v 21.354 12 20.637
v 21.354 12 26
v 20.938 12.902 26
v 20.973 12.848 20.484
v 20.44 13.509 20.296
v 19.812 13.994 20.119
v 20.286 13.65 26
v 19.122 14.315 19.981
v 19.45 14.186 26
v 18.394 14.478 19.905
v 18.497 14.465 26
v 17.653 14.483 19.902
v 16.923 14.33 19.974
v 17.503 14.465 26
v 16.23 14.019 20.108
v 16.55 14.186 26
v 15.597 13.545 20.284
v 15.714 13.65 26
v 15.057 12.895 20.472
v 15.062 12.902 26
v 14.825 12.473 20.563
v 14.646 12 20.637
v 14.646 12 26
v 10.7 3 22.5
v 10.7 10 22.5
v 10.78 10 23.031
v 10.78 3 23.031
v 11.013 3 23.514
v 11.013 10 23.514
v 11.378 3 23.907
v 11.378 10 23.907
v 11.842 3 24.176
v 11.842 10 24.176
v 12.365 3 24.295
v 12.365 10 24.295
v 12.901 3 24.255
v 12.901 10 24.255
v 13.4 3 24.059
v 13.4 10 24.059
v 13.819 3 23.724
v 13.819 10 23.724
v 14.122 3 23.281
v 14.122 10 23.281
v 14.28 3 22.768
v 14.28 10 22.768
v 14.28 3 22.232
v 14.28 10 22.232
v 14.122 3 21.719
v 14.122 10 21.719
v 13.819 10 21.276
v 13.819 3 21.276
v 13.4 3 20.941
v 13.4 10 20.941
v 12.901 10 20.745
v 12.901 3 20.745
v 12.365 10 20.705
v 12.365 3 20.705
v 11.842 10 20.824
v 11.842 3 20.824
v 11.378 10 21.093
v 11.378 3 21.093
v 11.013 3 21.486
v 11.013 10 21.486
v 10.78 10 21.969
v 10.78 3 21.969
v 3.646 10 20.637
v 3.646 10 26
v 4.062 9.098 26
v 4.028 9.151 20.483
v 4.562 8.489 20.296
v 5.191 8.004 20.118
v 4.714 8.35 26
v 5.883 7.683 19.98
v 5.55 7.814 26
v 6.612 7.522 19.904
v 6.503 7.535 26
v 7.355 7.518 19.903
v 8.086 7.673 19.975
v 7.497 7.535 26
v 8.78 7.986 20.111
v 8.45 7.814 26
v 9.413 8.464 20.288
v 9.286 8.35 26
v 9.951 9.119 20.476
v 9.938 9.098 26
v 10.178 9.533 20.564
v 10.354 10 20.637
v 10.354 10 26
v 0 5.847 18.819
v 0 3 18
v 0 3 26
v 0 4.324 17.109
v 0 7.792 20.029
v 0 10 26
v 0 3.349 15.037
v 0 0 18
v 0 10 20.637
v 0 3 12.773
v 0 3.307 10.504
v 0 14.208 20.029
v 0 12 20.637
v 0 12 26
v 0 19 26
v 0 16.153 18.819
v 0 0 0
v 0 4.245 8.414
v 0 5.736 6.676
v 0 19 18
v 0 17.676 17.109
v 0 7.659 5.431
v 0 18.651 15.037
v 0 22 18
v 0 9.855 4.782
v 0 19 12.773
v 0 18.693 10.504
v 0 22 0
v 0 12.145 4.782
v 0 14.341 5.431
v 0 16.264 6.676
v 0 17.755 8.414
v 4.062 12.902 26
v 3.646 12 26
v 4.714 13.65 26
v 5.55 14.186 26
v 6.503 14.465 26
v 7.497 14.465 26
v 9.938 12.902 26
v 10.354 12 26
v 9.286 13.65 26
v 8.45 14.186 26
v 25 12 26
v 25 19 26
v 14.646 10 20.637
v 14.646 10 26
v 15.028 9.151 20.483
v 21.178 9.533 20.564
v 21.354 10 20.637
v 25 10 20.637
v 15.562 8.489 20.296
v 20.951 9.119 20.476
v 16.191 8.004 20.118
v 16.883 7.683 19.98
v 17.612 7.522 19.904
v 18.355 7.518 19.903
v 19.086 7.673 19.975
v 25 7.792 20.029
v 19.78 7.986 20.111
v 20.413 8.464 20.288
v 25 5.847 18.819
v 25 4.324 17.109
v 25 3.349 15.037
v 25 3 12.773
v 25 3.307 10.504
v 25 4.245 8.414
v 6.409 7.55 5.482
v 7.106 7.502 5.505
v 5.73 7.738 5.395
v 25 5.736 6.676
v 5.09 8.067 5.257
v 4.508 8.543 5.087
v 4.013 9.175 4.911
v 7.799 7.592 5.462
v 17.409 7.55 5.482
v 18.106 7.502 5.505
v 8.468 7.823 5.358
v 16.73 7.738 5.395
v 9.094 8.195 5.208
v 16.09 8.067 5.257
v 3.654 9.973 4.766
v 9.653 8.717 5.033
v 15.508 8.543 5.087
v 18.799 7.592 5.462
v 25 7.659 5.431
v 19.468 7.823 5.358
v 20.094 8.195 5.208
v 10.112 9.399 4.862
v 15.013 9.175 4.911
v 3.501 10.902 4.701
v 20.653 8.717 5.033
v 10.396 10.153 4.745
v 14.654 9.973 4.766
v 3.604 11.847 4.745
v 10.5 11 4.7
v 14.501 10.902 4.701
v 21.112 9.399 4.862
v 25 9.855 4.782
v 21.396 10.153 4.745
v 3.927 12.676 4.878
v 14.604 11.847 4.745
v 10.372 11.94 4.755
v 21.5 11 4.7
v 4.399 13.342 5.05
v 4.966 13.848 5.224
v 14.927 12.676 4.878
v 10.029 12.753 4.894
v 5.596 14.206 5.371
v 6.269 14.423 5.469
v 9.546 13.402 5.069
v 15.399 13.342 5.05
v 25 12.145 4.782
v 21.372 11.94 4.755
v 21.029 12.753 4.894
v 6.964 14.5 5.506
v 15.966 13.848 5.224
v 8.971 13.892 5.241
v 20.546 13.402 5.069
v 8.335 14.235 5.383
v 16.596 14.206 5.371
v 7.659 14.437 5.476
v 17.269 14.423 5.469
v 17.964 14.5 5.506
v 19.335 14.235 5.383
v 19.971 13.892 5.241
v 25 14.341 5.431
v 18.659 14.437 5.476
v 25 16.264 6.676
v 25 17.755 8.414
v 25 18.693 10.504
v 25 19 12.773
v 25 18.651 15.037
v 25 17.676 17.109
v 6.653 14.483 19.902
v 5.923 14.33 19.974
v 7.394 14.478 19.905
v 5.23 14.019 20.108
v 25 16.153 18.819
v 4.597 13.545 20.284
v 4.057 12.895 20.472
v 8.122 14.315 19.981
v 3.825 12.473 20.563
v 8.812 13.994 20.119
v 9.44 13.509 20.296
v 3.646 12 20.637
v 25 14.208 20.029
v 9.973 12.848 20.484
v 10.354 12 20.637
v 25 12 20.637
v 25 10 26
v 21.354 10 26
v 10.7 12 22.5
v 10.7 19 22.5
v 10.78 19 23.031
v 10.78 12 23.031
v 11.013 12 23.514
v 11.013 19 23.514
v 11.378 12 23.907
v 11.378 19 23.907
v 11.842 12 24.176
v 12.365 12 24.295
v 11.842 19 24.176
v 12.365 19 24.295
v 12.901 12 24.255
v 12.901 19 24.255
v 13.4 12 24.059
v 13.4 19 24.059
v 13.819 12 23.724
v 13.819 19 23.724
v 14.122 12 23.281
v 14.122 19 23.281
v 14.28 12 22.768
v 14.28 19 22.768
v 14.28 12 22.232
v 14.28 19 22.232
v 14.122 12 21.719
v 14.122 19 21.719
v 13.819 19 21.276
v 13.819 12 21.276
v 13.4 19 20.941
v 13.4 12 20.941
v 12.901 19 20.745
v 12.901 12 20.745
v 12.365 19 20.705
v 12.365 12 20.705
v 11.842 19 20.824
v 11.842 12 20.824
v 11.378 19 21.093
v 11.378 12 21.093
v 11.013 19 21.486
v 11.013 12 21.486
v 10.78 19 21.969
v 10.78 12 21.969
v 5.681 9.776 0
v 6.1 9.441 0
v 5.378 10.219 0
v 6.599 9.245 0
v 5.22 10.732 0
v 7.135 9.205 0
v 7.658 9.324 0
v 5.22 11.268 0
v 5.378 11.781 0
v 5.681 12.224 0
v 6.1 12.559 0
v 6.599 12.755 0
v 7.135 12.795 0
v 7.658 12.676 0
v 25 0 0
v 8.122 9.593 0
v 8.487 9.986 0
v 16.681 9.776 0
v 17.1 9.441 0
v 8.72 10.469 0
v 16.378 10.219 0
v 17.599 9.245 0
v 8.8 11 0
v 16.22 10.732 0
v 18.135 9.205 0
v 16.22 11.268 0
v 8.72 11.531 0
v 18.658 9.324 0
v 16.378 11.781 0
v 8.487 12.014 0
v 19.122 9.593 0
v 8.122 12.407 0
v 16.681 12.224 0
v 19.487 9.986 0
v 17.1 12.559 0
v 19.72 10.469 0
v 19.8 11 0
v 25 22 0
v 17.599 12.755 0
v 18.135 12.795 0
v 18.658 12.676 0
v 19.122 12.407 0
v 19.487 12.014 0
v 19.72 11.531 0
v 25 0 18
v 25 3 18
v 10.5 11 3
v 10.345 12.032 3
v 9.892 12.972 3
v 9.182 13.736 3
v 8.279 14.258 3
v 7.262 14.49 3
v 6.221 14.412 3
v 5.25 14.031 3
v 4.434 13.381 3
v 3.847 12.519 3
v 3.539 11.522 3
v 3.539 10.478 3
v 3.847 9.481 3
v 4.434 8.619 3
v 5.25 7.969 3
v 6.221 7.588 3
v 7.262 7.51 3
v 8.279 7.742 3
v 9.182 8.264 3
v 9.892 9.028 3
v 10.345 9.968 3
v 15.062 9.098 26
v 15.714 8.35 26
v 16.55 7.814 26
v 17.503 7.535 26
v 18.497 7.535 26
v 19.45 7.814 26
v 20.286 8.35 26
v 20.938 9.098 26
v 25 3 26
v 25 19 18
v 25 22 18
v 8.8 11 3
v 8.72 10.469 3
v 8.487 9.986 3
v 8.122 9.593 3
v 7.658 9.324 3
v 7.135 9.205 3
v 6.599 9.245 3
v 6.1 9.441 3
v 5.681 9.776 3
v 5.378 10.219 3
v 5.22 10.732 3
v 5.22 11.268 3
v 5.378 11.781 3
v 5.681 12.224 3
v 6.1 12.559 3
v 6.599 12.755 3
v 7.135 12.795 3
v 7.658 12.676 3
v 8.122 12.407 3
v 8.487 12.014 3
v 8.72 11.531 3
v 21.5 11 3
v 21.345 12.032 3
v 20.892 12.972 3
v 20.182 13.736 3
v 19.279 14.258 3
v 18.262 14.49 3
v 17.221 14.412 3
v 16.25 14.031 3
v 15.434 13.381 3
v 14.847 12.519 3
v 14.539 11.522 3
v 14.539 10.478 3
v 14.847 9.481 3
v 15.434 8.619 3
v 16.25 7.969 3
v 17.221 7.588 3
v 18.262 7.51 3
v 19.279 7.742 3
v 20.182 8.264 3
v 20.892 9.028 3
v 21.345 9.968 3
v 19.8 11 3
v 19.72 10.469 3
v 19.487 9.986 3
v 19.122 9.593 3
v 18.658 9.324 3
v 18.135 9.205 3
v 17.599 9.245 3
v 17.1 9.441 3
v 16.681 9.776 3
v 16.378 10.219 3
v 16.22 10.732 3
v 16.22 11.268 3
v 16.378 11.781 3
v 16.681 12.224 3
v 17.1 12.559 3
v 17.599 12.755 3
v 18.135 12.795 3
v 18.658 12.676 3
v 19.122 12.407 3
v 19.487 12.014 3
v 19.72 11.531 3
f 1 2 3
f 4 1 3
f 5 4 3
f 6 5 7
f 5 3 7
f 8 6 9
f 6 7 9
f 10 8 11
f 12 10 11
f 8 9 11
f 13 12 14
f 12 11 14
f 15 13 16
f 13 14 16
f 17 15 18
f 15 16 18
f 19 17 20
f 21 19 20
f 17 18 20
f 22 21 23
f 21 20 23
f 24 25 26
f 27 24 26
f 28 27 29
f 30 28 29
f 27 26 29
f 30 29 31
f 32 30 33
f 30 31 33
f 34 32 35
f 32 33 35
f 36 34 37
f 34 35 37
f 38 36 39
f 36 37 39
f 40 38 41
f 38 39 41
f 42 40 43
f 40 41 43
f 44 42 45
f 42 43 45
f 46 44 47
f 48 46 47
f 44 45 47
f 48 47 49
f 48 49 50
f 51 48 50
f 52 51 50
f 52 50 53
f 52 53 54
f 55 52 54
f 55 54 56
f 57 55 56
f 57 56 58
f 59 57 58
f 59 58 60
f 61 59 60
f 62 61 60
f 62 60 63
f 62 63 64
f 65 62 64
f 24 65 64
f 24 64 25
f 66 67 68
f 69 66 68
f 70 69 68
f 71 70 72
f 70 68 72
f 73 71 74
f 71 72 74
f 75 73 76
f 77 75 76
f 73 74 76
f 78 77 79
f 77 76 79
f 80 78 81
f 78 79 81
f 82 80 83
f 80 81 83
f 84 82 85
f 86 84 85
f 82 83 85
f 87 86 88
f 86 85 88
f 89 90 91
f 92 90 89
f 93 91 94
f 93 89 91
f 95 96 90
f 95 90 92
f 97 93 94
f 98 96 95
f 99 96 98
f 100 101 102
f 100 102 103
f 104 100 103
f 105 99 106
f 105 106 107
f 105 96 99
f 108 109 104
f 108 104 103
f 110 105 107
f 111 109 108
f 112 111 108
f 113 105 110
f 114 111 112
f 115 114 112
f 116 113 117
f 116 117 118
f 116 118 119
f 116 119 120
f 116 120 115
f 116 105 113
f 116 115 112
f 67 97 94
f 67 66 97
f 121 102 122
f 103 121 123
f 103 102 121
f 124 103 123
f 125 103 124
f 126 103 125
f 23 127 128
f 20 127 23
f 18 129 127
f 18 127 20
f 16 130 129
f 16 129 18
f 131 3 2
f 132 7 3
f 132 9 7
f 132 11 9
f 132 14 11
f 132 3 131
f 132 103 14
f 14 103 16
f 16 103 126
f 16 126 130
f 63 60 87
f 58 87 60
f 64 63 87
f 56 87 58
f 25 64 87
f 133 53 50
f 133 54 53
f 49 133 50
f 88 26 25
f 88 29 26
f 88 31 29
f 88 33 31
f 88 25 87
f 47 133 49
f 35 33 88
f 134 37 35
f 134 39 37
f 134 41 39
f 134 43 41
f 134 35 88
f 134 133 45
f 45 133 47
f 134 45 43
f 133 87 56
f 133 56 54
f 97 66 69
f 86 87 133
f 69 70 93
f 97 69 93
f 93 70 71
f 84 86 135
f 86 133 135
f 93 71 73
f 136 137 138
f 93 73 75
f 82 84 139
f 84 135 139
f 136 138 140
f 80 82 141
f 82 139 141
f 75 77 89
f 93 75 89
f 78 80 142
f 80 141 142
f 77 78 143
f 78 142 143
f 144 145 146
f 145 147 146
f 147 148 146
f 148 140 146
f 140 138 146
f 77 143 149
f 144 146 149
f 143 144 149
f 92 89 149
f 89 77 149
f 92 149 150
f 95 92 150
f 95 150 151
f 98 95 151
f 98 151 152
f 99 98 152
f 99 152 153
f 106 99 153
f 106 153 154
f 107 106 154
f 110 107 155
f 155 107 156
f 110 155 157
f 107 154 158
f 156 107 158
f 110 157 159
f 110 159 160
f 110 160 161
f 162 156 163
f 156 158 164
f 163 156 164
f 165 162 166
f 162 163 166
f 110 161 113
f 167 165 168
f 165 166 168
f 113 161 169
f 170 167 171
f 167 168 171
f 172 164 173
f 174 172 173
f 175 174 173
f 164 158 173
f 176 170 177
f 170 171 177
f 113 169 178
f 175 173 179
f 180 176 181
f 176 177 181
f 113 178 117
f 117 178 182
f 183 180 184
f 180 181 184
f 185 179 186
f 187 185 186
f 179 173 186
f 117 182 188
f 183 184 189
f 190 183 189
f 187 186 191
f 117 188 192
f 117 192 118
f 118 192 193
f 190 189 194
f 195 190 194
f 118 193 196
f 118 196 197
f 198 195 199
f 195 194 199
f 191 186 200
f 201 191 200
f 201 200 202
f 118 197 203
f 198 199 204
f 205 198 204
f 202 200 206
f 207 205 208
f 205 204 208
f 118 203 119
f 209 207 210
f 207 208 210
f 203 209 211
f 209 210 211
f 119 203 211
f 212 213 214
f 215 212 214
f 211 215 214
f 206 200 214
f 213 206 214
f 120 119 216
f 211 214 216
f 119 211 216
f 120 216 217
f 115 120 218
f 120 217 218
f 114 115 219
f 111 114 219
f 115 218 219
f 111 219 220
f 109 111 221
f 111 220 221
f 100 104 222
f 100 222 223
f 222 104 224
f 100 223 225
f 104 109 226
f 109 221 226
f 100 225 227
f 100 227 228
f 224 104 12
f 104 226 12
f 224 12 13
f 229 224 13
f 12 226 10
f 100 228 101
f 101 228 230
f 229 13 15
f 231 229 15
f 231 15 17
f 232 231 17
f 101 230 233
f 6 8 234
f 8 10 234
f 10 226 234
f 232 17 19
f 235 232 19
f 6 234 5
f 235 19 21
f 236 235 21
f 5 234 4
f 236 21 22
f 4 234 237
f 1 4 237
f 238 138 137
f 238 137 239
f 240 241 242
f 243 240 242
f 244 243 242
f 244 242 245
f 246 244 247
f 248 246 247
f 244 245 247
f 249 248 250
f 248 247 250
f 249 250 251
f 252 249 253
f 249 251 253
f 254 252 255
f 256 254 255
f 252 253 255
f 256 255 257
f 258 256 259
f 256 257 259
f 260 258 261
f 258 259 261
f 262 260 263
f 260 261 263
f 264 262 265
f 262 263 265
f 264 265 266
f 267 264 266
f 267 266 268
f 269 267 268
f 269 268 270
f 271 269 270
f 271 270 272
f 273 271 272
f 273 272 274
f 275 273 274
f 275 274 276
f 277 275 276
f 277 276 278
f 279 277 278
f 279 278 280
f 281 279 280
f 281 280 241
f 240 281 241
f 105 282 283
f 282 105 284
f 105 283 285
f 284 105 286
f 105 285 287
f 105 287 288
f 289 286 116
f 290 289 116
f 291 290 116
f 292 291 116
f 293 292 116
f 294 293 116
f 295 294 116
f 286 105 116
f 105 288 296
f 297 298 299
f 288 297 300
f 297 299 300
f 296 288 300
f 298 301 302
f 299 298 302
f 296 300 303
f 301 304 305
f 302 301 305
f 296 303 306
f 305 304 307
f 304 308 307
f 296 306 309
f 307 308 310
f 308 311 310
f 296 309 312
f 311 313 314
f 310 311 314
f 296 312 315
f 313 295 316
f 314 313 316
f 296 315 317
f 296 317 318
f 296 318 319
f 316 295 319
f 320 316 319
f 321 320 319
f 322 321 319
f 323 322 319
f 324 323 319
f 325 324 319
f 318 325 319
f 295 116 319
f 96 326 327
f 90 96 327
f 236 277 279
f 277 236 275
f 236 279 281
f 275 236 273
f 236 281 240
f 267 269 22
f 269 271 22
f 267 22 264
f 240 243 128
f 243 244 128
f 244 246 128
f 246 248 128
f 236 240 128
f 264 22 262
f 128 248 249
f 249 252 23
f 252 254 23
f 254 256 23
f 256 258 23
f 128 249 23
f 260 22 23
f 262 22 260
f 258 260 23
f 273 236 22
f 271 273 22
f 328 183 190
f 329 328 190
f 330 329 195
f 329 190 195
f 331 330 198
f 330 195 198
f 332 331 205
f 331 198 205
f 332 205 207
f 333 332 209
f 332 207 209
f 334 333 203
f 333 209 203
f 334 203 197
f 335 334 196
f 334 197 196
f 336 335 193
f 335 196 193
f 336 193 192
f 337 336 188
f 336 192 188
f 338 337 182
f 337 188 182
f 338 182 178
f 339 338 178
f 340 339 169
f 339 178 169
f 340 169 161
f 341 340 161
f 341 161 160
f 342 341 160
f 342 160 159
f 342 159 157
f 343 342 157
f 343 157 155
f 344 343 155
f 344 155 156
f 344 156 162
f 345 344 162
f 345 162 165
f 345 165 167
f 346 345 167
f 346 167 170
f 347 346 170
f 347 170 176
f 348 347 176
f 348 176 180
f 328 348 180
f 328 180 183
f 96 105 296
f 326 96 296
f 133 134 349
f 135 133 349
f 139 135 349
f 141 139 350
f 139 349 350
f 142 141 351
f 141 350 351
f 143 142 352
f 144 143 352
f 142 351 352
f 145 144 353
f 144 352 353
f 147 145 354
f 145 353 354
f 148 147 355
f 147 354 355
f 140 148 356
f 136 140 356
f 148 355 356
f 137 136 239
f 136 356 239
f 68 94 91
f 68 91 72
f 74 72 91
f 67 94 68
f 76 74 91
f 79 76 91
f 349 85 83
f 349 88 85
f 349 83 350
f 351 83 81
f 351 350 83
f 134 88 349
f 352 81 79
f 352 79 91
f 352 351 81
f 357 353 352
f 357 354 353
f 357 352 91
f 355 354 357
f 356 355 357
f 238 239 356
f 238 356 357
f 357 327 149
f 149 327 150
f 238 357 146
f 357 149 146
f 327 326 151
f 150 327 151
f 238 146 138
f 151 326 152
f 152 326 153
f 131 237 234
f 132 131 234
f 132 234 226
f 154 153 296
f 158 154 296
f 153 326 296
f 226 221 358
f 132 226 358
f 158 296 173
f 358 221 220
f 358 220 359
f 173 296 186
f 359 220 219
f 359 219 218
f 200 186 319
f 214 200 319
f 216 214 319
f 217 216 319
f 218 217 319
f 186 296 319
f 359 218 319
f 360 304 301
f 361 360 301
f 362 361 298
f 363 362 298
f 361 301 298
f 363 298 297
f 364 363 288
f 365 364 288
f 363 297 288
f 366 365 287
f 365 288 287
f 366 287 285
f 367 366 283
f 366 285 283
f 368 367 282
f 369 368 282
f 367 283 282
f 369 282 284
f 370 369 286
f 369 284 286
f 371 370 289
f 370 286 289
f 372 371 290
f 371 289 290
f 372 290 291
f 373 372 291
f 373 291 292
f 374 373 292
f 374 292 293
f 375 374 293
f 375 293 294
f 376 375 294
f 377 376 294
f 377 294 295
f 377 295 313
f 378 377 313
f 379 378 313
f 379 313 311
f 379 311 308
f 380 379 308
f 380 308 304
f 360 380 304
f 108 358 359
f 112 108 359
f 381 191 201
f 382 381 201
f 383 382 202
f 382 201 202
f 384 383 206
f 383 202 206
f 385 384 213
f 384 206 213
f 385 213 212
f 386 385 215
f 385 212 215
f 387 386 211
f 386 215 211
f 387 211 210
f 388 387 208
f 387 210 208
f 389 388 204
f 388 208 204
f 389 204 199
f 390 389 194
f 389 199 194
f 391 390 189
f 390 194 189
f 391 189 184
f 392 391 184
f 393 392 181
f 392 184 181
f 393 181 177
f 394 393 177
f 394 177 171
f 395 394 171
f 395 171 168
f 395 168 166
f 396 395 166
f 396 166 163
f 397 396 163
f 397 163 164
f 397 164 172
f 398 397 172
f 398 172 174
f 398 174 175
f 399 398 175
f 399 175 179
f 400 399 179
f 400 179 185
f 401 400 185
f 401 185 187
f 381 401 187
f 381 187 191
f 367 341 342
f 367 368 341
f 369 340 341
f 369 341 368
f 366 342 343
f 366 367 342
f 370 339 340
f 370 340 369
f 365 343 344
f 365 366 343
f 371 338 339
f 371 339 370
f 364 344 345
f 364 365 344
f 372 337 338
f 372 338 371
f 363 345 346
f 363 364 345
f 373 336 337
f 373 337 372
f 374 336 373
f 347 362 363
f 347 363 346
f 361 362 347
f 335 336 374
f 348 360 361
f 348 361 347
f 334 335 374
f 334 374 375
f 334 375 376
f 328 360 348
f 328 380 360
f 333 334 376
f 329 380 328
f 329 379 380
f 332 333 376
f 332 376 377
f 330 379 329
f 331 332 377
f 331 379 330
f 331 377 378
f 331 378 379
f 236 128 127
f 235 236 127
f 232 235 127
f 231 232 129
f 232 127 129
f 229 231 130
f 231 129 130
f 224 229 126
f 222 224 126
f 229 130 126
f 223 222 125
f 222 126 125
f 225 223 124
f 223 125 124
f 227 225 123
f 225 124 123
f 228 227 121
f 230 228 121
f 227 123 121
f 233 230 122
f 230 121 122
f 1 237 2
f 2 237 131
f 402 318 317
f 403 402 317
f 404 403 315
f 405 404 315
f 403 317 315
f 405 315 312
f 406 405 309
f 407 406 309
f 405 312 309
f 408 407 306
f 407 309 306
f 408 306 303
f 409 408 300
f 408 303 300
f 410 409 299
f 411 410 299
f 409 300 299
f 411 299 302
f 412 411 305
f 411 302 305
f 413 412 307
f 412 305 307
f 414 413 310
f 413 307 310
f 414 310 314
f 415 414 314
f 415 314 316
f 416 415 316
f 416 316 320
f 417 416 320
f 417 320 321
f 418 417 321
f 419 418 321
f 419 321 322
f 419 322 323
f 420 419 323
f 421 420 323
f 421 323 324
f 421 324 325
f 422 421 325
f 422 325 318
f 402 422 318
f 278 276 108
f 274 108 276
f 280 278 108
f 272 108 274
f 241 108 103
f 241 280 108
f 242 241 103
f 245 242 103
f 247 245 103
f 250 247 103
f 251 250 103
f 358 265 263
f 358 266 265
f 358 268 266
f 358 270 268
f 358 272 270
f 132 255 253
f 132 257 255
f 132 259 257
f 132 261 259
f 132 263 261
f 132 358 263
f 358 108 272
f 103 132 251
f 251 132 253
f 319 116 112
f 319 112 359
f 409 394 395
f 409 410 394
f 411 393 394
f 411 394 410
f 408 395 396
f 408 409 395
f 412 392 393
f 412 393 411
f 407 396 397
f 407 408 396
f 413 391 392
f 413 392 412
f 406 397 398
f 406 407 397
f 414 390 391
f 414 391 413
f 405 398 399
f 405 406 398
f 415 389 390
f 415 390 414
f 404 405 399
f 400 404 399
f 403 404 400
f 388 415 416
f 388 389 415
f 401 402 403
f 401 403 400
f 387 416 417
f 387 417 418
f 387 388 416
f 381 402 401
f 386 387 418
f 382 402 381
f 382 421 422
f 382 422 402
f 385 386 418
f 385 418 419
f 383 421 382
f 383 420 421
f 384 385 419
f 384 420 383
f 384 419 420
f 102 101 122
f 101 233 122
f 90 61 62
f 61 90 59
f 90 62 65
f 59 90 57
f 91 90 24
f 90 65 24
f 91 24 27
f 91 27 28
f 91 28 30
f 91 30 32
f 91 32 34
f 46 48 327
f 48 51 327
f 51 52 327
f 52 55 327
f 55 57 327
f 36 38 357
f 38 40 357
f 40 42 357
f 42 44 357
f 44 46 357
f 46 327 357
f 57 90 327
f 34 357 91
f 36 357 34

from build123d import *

# Parameters (mm, degrees)
BOX_W           = 25
BOX_H           = 22
BOX_DEPTH       = 26
SKETCH_R        = 8
POCKET_DEPTH    = 25.001
SKETCH001_R     = 3.5
POCKET001_DEPTH = 23
SKETCH002_R     = 1.8
POCKET002_DEPTH = 5
SKETCH003_R     = 1.8
POCKET003_DEPTH = 22.001
SKETCH004_W     = 2
SKETCH004_H     = 11.298807
SKETCH004_W_2   = 3
SKETCH004_H_2   = 8
POCKET004_DEPTH = 25.001


with BuildPart() as part:
    # Box → Box (new body)
    with BuildSketch(Plane.XY):
        with Locations((12.5, 11)):
            Rectangle(BOX_W, BOX_H)
    extrude(amount=BOX_DEPTH)

    # Sketch → Pocket (cut, through all)
    with BuildSketch(Plane.YZ.offset(25)):
        with Locations((11, 12.7)):
            Circle(SKETCH_R)
    extrude(amount=-POCKET_DEPTH, mode=Mode.SUBTRACT)

    # Sketch001 → Pocket001 (cut)
    with BuildSketch(Plane.XY.offset(26)):
        with Locations((7, 11)):
            Circle(SKETCH001_R)
        with Locations((18, 11)):
            Circle(SKETCH001_R)
    extrude(amount=-POCKET001_DEPTH, mode=Mode.SUBTRACT)

    # Sketch002 → Pocket002 (cut)
    with BuildSketch(Plane(origin=(0, 0, 0), x_dir=(1, 0, 0), z_dir=(0, 0, -1))):
        with Locations((7, -11)):
            Circle(SKETCH002_R)
        with Locations((18, -11)):
            Circle(SKETCH002_R)
    extrude(amount=-POCKET002_DEPTH, mode=Mode.SUBTRACT)

    # Sketch003 → Pocket003 (cut, through all)
    with BuildSketch(Plane(origin=(0, 22, 0), x_dir=(-1, 0, 0), z_dir=(0, 1, 0))):
        with Locations((-12.5, 22.5)):
            Circle(SKETCH003_R)
    extrude(amount=-POCKET003_DEPTH, mode=Mode.SUBTRACT)

    # Sketch004 → Pocket004 (cut, through all)
    with BuildSketch(Plane.YZ.offset(25)):
        with Locations((11, 23.747477)):
            Rectangle(SKETCH004_W, SKETCH004_H)
        with Locations((1.5, 22)):
            Rectangle(SKETCH004_W_2, SKETCH004_H_2)
        with Locations((20.5, 22)):
            Rectangle(SKETCH004_W_2, SKETCH004_H_2)
    extrude(amount=-POCKET004_DEPTH, mode=Mode.SUBTRACT)


solid = part.part
